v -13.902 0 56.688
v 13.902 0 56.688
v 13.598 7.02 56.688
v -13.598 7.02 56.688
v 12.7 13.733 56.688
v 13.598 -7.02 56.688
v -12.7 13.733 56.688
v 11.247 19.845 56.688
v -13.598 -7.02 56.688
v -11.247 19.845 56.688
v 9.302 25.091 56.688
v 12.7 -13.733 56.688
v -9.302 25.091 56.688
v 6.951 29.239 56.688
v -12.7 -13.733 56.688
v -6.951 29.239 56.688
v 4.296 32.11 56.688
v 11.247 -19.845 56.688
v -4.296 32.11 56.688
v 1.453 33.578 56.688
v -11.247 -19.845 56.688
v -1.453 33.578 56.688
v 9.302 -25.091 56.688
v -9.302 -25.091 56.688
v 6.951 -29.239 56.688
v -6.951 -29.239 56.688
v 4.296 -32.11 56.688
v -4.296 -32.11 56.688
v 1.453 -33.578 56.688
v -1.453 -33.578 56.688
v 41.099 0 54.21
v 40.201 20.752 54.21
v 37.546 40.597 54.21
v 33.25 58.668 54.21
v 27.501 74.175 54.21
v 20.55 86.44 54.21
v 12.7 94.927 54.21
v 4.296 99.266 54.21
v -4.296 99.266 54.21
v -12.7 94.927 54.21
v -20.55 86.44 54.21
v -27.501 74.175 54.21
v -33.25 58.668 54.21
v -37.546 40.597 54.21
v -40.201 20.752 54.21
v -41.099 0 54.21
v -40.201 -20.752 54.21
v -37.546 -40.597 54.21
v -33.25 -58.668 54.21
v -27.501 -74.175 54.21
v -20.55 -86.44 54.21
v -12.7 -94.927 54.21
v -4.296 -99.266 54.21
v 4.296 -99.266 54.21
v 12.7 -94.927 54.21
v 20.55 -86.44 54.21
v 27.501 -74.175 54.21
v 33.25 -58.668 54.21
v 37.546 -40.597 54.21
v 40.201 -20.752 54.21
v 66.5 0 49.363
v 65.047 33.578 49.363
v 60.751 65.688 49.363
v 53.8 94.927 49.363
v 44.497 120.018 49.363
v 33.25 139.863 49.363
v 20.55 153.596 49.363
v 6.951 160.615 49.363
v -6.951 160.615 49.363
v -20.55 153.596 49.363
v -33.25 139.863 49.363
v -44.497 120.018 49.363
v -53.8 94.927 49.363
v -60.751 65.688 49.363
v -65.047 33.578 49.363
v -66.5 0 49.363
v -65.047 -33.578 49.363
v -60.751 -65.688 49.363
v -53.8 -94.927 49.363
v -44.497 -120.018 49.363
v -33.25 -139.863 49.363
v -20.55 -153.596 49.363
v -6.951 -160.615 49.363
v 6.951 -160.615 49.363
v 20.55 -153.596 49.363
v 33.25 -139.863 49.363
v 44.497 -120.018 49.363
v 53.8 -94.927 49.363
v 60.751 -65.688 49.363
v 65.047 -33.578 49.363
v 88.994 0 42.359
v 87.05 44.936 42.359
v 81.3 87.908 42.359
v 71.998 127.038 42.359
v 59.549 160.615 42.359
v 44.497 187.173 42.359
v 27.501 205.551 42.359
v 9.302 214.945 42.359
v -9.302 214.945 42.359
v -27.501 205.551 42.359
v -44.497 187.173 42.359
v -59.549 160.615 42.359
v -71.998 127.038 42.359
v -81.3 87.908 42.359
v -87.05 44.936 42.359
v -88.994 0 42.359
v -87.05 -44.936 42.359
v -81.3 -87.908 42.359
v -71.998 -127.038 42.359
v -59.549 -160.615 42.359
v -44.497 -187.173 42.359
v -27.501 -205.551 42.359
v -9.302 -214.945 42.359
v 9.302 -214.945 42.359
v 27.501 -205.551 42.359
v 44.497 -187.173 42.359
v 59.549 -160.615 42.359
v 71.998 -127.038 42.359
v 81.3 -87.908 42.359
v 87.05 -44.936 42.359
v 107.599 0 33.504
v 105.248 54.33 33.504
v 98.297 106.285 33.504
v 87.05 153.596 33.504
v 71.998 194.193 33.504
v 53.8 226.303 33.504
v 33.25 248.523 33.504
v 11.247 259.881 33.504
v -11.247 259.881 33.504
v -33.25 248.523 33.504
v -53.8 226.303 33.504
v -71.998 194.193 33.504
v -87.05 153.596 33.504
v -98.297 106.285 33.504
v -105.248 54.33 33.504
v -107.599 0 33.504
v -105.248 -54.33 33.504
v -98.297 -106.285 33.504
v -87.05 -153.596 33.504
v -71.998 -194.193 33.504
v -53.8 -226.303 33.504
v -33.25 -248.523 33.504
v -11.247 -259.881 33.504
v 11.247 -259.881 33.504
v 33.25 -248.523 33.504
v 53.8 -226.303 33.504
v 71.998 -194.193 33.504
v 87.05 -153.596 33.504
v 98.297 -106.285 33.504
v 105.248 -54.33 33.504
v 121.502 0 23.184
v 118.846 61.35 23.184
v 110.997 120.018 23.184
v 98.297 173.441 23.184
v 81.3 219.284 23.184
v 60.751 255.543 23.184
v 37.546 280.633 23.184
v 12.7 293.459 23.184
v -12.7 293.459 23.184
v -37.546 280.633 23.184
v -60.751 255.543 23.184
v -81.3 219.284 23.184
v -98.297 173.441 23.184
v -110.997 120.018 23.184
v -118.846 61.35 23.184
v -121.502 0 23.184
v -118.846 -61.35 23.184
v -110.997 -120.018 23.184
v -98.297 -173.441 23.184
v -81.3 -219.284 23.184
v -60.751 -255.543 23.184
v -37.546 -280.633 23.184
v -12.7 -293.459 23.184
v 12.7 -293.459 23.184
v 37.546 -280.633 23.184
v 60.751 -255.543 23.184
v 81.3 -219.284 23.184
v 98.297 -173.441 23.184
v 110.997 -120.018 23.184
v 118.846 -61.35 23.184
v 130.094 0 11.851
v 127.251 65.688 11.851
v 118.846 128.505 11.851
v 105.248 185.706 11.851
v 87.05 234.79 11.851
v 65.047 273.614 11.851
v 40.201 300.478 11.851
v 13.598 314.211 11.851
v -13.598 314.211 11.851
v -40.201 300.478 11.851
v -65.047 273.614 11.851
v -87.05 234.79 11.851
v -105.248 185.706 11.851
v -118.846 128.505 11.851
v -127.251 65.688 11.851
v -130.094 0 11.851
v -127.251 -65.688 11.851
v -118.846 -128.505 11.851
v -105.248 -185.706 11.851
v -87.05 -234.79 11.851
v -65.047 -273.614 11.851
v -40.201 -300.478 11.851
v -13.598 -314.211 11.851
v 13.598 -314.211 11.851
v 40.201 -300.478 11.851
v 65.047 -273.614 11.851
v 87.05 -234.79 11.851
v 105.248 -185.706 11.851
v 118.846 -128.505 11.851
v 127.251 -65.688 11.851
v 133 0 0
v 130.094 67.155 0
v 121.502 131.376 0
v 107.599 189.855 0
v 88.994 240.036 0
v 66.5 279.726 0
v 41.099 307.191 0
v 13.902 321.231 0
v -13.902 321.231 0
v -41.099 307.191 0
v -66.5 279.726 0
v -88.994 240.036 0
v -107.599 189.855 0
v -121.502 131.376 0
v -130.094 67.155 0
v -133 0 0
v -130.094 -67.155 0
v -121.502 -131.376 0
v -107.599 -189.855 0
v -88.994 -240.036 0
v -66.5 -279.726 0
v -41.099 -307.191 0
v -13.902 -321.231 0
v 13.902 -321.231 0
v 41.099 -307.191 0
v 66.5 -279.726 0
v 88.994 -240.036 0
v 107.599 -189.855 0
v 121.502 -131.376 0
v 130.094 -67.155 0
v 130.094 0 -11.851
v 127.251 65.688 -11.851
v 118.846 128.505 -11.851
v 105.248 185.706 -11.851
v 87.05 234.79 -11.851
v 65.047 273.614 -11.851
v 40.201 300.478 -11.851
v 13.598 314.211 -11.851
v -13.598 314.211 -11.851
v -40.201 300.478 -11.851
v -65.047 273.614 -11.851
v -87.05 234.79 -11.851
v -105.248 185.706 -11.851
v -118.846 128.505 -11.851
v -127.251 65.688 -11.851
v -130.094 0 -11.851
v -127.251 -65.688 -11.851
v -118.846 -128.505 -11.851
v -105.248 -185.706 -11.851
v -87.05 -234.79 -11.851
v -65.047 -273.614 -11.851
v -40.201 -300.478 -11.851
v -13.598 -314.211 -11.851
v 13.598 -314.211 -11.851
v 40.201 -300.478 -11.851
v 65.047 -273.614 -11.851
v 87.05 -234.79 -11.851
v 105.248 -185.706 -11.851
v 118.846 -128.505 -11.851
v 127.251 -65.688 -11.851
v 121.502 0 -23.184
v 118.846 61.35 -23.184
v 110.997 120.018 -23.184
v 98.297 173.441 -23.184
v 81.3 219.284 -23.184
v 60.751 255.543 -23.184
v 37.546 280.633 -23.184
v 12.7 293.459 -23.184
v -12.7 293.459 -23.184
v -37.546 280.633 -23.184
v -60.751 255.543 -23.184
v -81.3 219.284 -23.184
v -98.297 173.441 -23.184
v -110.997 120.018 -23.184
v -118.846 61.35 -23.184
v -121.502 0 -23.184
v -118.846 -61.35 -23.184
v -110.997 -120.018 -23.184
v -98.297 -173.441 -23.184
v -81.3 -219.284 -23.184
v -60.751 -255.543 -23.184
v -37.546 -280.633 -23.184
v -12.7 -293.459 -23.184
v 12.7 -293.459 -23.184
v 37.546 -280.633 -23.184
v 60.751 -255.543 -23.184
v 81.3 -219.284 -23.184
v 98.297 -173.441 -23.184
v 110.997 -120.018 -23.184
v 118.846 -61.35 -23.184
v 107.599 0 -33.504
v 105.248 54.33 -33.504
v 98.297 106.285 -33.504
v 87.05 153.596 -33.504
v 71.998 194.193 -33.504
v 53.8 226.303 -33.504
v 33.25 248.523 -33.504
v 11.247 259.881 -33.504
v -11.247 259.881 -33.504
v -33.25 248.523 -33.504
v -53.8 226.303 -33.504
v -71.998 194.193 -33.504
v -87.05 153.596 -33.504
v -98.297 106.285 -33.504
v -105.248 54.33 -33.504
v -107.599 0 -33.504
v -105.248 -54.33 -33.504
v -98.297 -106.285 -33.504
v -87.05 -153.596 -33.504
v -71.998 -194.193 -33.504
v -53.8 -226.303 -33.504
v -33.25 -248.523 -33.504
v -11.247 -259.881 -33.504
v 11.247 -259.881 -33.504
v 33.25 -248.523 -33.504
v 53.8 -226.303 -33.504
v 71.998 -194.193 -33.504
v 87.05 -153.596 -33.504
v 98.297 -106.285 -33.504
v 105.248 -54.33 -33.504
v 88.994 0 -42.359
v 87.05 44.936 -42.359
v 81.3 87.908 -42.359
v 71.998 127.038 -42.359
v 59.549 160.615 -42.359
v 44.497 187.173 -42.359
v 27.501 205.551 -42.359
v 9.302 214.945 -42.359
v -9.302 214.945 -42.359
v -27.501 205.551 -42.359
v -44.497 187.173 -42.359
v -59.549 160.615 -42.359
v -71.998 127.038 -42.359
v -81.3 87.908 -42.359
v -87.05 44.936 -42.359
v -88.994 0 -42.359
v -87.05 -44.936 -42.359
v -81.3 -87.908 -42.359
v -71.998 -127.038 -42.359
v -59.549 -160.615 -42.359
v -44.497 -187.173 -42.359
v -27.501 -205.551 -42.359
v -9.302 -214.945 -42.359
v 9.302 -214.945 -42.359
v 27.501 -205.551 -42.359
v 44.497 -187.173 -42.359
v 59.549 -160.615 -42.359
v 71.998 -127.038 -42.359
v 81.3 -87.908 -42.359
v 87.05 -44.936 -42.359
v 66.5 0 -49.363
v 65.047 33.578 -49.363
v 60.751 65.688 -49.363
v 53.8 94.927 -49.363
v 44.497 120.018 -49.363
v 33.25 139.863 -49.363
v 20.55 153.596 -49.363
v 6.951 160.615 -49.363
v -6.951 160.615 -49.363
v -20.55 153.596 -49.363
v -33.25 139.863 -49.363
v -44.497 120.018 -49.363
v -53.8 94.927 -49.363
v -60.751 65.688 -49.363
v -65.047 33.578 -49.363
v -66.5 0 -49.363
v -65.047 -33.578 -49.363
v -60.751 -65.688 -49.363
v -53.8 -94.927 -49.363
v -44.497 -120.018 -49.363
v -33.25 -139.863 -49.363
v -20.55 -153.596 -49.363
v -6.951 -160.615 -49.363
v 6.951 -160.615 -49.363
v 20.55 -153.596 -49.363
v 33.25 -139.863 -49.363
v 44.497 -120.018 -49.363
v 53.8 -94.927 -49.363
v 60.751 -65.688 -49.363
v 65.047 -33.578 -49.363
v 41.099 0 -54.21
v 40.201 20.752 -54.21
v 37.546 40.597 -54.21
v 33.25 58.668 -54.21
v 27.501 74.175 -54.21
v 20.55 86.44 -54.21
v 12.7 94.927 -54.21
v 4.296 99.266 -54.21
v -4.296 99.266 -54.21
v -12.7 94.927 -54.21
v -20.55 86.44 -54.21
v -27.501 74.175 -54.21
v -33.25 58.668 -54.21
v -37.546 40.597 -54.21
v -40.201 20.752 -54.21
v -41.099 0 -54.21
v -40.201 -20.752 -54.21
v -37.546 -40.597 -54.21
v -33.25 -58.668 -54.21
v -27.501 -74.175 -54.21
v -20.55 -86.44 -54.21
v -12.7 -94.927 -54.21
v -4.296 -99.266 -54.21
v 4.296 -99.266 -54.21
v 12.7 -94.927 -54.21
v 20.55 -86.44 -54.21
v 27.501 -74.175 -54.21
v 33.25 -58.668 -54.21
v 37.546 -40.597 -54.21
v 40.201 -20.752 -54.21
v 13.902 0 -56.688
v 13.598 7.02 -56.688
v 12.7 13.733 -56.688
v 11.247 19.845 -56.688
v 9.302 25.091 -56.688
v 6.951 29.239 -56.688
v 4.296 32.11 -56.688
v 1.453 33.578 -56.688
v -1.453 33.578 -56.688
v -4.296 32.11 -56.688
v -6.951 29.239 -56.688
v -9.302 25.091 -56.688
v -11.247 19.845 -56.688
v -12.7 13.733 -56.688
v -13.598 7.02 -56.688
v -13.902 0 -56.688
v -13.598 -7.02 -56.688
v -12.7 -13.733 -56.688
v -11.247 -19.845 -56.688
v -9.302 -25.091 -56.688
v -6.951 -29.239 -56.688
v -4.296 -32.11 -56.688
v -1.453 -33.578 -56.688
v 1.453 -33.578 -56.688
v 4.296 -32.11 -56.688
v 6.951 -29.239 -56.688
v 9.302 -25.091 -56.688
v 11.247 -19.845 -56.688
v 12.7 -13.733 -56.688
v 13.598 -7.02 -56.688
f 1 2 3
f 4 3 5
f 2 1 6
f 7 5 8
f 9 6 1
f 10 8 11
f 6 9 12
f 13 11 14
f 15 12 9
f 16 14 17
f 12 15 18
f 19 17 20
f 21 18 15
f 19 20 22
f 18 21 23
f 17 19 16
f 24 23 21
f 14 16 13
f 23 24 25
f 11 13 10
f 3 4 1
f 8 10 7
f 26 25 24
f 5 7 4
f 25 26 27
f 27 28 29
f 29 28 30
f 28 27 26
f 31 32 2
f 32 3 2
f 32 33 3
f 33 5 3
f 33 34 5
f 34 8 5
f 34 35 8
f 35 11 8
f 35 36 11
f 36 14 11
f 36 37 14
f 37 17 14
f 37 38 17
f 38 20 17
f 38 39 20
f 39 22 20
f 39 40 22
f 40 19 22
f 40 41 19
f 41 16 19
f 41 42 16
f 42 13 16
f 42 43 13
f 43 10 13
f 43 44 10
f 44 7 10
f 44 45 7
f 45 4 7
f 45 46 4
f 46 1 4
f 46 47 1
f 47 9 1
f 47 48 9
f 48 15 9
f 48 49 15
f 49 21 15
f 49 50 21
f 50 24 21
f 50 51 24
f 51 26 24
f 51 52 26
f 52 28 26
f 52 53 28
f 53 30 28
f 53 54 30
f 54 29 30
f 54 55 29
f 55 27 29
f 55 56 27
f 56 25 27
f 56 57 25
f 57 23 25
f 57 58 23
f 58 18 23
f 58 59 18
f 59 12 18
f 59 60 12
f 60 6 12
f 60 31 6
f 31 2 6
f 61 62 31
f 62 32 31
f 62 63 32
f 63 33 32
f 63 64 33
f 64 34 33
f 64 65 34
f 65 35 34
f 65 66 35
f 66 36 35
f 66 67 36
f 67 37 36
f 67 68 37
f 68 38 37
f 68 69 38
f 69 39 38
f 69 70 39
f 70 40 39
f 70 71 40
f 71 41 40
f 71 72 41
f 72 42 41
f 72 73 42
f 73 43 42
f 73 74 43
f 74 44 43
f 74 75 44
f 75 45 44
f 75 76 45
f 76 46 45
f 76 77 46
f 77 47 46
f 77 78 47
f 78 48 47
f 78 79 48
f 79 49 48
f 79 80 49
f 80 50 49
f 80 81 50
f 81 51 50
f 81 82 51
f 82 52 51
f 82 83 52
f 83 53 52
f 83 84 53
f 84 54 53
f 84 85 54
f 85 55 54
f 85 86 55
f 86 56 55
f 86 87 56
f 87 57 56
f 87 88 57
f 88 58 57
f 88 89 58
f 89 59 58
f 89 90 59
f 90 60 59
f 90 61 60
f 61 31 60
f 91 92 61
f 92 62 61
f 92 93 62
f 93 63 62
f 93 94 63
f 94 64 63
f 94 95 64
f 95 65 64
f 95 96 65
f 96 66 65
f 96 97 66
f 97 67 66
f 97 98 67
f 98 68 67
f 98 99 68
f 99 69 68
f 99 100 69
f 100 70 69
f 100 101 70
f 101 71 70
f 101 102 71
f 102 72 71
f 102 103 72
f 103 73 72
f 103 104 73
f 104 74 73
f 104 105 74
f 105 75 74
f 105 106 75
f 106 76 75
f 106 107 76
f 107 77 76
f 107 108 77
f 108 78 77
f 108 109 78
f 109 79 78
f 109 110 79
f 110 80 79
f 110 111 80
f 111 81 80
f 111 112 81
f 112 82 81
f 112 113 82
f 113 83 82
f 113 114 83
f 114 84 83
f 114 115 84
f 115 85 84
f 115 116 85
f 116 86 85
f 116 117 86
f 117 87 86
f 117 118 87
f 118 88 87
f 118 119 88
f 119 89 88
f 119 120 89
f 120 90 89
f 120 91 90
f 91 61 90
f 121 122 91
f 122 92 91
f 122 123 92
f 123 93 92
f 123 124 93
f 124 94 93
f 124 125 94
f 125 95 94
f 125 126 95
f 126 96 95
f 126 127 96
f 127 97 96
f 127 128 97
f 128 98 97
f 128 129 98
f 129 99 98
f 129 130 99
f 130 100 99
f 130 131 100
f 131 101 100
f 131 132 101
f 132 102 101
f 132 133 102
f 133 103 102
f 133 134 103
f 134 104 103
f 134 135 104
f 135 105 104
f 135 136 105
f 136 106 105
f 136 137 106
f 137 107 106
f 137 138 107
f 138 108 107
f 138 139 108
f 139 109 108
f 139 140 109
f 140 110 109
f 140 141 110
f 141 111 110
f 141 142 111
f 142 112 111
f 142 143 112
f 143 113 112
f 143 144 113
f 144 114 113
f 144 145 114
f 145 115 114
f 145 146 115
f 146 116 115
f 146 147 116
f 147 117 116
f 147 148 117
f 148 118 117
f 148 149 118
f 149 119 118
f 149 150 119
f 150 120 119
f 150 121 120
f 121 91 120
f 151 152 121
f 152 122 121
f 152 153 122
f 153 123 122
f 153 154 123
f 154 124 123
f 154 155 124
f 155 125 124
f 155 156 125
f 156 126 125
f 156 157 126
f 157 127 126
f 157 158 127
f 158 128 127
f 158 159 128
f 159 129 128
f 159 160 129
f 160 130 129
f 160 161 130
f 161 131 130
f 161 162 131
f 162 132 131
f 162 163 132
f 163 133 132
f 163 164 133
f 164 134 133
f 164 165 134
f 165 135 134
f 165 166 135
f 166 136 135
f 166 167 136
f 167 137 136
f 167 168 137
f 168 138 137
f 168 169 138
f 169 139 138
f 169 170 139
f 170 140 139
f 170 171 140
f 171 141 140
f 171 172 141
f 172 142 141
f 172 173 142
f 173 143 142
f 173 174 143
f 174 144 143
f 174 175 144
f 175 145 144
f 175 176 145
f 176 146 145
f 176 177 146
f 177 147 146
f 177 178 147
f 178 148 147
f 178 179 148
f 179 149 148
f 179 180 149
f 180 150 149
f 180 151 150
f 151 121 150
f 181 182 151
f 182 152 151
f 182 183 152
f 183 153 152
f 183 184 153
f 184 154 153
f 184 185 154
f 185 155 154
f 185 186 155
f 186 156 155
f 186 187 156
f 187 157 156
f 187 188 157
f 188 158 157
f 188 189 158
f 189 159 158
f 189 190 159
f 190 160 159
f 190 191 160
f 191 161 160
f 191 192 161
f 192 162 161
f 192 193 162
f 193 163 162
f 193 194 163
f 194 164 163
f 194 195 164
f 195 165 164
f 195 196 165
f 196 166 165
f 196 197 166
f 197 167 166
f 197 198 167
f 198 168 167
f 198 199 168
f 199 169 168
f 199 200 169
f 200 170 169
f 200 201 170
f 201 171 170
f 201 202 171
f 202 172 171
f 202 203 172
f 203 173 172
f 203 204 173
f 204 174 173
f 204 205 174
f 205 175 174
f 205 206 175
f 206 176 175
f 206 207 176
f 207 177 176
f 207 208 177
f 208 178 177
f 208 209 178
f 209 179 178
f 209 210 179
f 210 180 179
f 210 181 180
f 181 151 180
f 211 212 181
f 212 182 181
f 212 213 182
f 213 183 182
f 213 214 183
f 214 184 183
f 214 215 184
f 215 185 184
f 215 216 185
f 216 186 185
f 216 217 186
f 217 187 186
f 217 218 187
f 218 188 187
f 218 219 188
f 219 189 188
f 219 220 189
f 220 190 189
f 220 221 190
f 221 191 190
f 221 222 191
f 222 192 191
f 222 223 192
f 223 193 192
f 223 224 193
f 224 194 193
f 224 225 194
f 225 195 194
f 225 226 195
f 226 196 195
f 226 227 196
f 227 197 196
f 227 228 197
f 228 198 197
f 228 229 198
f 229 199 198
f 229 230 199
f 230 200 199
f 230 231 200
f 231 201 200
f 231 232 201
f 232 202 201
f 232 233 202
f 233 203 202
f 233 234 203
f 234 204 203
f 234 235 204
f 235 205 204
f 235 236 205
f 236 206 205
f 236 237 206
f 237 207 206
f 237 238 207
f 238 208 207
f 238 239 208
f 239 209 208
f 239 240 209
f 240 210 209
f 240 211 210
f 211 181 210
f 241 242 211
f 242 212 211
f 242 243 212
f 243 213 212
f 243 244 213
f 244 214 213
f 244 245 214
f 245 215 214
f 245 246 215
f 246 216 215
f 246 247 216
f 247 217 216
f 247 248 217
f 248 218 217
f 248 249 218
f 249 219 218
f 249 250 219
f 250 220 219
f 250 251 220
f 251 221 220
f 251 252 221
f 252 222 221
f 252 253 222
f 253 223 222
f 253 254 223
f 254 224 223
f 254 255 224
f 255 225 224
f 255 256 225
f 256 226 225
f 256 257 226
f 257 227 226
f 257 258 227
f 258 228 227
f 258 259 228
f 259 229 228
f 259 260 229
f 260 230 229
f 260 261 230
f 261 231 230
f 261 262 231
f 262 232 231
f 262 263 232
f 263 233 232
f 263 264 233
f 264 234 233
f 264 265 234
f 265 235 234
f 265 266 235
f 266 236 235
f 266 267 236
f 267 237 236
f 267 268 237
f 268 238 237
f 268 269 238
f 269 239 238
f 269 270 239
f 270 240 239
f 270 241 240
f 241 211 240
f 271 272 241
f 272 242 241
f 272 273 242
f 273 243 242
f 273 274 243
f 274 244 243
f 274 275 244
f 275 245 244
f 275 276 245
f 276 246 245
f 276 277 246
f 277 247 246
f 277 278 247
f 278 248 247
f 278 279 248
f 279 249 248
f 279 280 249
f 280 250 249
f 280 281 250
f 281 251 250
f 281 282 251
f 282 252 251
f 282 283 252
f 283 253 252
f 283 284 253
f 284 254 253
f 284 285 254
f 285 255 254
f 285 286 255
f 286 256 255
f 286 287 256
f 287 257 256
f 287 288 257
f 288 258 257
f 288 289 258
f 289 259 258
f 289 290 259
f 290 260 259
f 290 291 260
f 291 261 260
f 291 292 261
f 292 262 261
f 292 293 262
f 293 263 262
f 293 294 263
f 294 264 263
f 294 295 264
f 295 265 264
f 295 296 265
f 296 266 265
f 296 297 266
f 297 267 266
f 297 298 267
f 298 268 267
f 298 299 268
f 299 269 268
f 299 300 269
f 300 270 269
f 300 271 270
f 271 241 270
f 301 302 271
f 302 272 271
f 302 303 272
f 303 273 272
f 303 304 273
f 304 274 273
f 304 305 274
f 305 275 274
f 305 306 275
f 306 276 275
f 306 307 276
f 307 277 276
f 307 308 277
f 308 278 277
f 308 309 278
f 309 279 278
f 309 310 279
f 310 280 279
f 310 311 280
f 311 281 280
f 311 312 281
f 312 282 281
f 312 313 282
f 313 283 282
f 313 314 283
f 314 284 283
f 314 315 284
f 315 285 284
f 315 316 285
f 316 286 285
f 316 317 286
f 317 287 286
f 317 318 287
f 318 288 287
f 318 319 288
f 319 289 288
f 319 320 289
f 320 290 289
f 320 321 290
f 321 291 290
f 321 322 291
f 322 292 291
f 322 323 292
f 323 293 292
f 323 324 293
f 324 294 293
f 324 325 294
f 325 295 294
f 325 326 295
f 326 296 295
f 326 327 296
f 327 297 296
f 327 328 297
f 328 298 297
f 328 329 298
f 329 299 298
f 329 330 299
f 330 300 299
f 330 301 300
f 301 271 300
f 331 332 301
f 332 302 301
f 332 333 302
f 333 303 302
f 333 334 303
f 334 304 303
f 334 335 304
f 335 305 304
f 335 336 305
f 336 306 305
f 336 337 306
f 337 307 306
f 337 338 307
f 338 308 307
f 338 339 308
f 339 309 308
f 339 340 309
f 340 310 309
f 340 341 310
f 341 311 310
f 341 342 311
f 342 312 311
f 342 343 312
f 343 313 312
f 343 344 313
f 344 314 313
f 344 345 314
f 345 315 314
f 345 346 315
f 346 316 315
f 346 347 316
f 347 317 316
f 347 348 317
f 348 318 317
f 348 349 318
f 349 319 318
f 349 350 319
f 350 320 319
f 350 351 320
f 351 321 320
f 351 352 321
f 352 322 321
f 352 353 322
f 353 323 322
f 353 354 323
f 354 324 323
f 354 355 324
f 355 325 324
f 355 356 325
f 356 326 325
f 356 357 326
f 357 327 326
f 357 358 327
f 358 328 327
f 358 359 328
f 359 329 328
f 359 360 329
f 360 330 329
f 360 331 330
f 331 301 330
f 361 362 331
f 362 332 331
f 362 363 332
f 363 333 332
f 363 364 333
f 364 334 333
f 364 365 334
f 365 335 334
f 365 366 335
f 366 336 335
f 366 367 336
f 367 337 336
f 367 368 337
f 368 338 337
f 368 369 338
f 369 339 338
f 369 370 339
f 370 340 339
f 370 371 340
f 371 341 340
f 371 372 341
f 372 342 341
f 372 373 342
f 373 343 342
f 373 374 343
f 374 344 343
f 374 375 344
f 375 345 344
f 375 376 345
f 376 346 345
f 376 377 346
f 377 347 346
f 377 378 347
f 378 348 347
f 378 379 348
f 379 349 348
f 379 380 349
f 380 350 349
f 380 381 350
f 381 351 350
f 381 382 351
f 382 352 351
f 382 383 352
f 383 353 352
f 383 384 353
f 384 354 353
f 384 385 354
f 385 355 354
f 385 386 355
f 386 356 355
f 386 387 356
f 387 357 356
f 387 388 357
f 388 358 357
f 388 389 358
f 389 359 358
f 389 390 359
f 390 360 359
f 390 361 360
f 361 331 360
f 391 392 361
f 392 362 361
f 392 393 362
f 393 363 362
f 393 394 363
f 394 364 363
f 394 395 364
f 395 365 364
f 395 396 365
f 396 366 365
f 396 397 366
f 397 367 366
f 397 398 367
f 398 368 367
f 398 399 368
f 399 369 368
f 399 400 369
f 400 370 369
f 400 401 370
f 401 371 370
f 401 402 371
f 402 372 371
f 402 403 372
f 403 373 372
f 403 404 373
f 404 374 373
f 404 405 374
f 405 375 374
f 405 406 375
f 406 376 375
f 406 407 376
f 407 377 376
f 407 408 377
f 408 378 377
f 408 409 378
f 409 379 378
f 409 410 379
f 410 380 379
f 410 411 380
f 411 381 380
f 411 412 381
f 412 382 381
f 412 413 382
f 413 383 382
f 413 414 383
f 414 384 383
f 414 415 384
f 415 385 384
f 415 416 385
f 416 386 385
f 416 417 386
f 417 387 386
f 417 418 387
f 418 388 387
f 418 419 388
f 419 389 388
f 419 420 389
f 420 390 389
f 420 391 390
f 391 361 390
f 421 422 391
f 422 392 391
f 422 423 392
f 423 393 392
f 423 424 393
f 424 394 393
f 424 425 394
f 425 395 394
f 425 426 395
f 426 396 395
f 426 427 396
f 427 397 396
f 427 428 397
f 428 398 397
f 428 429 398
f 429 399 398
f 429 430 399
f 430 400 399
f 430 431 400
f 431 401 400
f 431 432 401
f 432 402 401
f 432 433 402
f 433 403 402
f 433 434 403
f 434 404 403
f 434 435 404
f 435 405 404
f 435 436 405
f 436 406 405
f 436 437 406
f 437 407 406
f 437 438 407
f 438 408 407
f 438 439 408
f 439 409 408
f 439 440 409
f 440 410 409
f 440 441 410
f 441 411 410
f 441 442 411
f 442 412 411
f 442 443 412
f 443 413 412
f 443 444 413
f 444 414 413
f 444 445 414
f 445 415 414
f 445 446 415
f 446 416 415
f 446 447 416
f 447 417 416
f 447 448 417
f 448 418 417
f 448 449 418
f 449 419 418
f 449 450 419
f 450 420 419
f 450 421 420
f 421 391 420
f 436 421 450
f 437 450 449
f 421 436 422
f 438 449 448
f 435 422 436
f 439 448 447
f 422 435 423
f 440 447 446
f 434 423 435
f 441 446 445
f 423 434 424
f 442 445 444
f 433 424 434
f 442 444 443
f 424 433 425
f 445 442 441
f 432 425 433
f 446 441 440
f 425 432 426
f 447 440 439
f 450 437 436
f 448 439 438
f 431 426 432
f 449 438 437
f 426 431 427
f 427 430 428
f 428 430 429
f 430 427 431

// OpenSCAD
// Generated by SolidPython 1.0.1 on 2020-07-29 00:46:48


scale(v = [7, 17, 3]) {
	sphere(r = 19);
}
/***********************************************
*********      SolidPython code:      **********
************************************************
 
# import packages: SolidPython
from solid import *
from solid.utils import *
from itertools import chain, combinations, permutations


class Resize:

    def __init__(self, scad_file):
        self.scad_file = scad_file
        #self.scad_file = import_scad(scad_file)
        # cone/cylinder param:
        self.r1 = 0
        self.r2 = 0
        self.h = 0
        # rectangular prism param:
        self.w = 0
        self.l = 0
        # ellipse param:
        self.r = 0

    # import OpenScad code (file name corresponds to shape)


    # classify shape + parameters
    def assign(self, param1, param2, param3):
        if self.scad_file == 'cone.scad':
            self.r1 = param1
            self.r2 = param2
            self.h = param3
        elif self.scad_file == 'cylinder.scad':
            self.r1 = param1
            self.r2 = param2
            self.h = param3
        elif self.scad_file == 'rectangularPrism.scad':
            self.h = param1
            self.l = param2
            self.w = param3
        else:
            self.r = param1
            self.h = param2

    # resize parameters
    def iterate(self):
        x = range(3, 20, 2)
        i = 1
        if self.scad_file == 'cone.scad':
            tempList = list(permutations(x, 2))
            for temp in tempList:
                param1 = temp[0]
                param2 = temp[1]
                filepath = 'produced_scad_files/' + 'cone' + str(param1) + '_' + str(param2) + '_' + '.scad'
                scad_render_to_file(cylinder(h=param1, r1=param2, r2=0), filepath)

        elif self.scad_file == 'cylinder.scad':
            tempList = list(permutations(x, 3))
            for temp in tempList:
                param1 = temp[0]
                param2 = temp[1]
                filepath = 'produced_scad_files/' + 'cylinder' + str(param1) + '_' + str(param2) + '_' + '.scad'
                scad_render_to_file(cylinder(h=param1, r1=param2, r2=param2), filepath)

        elif self.scad_file == 'rectangularPrism.scad':
            tempList = list(permutations(x, 3))
            for temp in tempList:
                param1 = temp[0]
                param2 = temp[1]
                param3 = temp[2]
                filepath = 'produced_scad_files/' + 'rectangularPrism' + str(param1) + '_' + str(param2) + '_' + str(
                    param3) + '.scad'
                scad_render_to_file(cube(size=(param1, param2, param3)), filepath)

        elif self.scad_file == 'ellipse.scad':
            tempList = list(permutations(x, 4))
            for temp in tempList:
                param1 = temp[0]
                param2 = temp[1]
                param3 = temp[2]
                param4 = temp[3]
                filepath = 'produced_scad_files/' + 'ellipse' + str(param1) + '_' + str(param2) + '_' + str(param3) + '_' + str(param4) + '.scad'
                scad_render_to_file(scale([param1, param2, param3])(sphere(r=param4)), filepath)

    def render_to_scadfile(self):
        scad_render_to_file(scad, 'example.scad') 
 
************************************************/
